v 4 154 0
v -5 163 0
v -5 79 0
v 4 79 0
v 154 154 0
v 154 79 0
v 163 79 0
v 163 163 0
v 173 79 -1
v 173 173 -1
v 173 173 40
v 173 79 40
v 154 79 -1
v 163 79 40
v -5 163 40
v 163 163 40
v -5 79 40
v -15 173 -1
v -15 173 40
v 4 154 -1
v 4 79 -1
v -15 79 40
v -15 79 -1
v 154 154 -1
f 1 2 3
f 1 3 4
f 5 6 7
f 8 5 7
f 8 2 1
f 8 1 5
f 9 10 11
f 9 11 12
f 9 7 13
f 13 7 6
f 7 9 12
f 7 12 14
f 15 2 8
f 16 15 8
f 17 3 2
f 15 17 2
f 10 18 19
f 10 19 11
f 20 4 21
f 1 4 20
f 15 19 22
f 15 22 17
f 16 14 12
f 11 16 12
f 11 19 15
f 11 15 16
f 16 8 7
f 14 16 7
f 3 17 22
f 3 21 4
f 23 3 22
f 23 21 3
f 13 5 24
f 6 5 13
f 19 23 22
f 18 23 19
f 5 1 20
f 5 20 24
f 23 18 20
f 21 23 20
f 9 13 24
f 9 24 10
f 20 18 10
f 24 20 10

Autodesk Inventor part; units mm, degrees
ref_plane "YZ Plane" through (0, 0, 0) normal (1, 0, 0) x (0, 1, 0)
ref_plane "XZ Plane" through (0, 0, 0) normal (0, 1, 0) x (-1, 0, 0)
ref_plane "XY Plane" through (0, 0, 0) normal (0, 0, 1) x (1, 0, 0)
sketch "Sketch1" plane through (0, 0, 0) normal (0, 0, 1) x (1, 0, 0)
  line L0 (-273.8289, 101.7521) -> (-188.1039, 101.7521) construction
  line L1 (-188.1039, 101.7521) -> (-188.1039, 47.7771) construction
  line L2 (-188.1039, 47.7771) -> (-273.8289, 47.7771) construction
  line L3 (-273.8289, 47.7771) -> (-273.8289, 101.7521) construction
  line L4 (-343.37, 152.3416) -> (456.63, 152.3416) construction
  line L5 (456.63, 152.3416) -> (456.63, -1269.8807) construction
  line L6 (456.63, -1269.8807) -> (-343.37, -1269.8807) construction
  line L7 (-343.37, -1269.8807) -> (-343.37, 152.3416) construction
  line L8 (0, 0) -> (0, 158) construction
  line L9 (0, 158) -> (158, 158) construction
  line L10 (158, 158) -> (158, 0) construction
  line L11 (158, 0) -> (0, 0) construction
  line L12 (26, 26) -> (26, 132) construction
  line L13 (26, 132) -> (132, 132) construction
  line L14 (132, 132) -> (132, 26) construction
  line L15 (132, 26) -> (26, 26) construction
  line L16 (0, 158) -> (158, 0) construction
  line L17 (26, 26) -> (132, 132) construction
  line L18 (-5, 163) -> (163, 163)
  line L19 (163, 163) -> (163, 79)
  line L20 (163, 79) -> (-5, 79)
  line L21 (-5, 79) -> (-5, 163)
  line L22 (-15, 173) -> (173, 173)
  line L23 (173, 173) -> (173, 79)
  line L24 (173, 79) -> (-15, 79)
  line L25 (-15, 79) -> (-15, 173)
  line L26 (4, 154) -> (154, 154)
  line L27 (154, 154) -> (154, 79)
  line L28 (154, 79) -> (4, 79)
  line L29 (4, 79) -> (4, 154)
  point P0 (79, 79)
  point P1 (4, 79)
  point P2 (163, 79)
  point P3 (163, 79)
  dimension "d1" = 85.725
  dimension "d2" = 53.975
  dimension "d43" = 800.0001
  dimension "d52" = 158
  dimension "d53" = 158
  dimension "d59" = 106
  dimension "d60" = 106
  dimension "d62" = 5
  dimension "d63" = 5
  dimension "d64" = 5
  dimension "d65" = 10
  dimension "d66" = 10
  dimension "d67" = 10
  dimension "d68" = 4
  dimension "d69" = 4
  dimension "d70" = 4
extrude "Extrusion1" add sketch "Sketch1" against normal blind 1 contours L21 L24 L25 L22 L23 L19 L18 | L18 L19 L20 L27 L26 L29 L21
extrude "Extrusion2" add sketch "Sketch1" along normal blind 40 contours L21 L24 L25 L22 L23 L19 L18
properties part number "DoorButtonMount"
